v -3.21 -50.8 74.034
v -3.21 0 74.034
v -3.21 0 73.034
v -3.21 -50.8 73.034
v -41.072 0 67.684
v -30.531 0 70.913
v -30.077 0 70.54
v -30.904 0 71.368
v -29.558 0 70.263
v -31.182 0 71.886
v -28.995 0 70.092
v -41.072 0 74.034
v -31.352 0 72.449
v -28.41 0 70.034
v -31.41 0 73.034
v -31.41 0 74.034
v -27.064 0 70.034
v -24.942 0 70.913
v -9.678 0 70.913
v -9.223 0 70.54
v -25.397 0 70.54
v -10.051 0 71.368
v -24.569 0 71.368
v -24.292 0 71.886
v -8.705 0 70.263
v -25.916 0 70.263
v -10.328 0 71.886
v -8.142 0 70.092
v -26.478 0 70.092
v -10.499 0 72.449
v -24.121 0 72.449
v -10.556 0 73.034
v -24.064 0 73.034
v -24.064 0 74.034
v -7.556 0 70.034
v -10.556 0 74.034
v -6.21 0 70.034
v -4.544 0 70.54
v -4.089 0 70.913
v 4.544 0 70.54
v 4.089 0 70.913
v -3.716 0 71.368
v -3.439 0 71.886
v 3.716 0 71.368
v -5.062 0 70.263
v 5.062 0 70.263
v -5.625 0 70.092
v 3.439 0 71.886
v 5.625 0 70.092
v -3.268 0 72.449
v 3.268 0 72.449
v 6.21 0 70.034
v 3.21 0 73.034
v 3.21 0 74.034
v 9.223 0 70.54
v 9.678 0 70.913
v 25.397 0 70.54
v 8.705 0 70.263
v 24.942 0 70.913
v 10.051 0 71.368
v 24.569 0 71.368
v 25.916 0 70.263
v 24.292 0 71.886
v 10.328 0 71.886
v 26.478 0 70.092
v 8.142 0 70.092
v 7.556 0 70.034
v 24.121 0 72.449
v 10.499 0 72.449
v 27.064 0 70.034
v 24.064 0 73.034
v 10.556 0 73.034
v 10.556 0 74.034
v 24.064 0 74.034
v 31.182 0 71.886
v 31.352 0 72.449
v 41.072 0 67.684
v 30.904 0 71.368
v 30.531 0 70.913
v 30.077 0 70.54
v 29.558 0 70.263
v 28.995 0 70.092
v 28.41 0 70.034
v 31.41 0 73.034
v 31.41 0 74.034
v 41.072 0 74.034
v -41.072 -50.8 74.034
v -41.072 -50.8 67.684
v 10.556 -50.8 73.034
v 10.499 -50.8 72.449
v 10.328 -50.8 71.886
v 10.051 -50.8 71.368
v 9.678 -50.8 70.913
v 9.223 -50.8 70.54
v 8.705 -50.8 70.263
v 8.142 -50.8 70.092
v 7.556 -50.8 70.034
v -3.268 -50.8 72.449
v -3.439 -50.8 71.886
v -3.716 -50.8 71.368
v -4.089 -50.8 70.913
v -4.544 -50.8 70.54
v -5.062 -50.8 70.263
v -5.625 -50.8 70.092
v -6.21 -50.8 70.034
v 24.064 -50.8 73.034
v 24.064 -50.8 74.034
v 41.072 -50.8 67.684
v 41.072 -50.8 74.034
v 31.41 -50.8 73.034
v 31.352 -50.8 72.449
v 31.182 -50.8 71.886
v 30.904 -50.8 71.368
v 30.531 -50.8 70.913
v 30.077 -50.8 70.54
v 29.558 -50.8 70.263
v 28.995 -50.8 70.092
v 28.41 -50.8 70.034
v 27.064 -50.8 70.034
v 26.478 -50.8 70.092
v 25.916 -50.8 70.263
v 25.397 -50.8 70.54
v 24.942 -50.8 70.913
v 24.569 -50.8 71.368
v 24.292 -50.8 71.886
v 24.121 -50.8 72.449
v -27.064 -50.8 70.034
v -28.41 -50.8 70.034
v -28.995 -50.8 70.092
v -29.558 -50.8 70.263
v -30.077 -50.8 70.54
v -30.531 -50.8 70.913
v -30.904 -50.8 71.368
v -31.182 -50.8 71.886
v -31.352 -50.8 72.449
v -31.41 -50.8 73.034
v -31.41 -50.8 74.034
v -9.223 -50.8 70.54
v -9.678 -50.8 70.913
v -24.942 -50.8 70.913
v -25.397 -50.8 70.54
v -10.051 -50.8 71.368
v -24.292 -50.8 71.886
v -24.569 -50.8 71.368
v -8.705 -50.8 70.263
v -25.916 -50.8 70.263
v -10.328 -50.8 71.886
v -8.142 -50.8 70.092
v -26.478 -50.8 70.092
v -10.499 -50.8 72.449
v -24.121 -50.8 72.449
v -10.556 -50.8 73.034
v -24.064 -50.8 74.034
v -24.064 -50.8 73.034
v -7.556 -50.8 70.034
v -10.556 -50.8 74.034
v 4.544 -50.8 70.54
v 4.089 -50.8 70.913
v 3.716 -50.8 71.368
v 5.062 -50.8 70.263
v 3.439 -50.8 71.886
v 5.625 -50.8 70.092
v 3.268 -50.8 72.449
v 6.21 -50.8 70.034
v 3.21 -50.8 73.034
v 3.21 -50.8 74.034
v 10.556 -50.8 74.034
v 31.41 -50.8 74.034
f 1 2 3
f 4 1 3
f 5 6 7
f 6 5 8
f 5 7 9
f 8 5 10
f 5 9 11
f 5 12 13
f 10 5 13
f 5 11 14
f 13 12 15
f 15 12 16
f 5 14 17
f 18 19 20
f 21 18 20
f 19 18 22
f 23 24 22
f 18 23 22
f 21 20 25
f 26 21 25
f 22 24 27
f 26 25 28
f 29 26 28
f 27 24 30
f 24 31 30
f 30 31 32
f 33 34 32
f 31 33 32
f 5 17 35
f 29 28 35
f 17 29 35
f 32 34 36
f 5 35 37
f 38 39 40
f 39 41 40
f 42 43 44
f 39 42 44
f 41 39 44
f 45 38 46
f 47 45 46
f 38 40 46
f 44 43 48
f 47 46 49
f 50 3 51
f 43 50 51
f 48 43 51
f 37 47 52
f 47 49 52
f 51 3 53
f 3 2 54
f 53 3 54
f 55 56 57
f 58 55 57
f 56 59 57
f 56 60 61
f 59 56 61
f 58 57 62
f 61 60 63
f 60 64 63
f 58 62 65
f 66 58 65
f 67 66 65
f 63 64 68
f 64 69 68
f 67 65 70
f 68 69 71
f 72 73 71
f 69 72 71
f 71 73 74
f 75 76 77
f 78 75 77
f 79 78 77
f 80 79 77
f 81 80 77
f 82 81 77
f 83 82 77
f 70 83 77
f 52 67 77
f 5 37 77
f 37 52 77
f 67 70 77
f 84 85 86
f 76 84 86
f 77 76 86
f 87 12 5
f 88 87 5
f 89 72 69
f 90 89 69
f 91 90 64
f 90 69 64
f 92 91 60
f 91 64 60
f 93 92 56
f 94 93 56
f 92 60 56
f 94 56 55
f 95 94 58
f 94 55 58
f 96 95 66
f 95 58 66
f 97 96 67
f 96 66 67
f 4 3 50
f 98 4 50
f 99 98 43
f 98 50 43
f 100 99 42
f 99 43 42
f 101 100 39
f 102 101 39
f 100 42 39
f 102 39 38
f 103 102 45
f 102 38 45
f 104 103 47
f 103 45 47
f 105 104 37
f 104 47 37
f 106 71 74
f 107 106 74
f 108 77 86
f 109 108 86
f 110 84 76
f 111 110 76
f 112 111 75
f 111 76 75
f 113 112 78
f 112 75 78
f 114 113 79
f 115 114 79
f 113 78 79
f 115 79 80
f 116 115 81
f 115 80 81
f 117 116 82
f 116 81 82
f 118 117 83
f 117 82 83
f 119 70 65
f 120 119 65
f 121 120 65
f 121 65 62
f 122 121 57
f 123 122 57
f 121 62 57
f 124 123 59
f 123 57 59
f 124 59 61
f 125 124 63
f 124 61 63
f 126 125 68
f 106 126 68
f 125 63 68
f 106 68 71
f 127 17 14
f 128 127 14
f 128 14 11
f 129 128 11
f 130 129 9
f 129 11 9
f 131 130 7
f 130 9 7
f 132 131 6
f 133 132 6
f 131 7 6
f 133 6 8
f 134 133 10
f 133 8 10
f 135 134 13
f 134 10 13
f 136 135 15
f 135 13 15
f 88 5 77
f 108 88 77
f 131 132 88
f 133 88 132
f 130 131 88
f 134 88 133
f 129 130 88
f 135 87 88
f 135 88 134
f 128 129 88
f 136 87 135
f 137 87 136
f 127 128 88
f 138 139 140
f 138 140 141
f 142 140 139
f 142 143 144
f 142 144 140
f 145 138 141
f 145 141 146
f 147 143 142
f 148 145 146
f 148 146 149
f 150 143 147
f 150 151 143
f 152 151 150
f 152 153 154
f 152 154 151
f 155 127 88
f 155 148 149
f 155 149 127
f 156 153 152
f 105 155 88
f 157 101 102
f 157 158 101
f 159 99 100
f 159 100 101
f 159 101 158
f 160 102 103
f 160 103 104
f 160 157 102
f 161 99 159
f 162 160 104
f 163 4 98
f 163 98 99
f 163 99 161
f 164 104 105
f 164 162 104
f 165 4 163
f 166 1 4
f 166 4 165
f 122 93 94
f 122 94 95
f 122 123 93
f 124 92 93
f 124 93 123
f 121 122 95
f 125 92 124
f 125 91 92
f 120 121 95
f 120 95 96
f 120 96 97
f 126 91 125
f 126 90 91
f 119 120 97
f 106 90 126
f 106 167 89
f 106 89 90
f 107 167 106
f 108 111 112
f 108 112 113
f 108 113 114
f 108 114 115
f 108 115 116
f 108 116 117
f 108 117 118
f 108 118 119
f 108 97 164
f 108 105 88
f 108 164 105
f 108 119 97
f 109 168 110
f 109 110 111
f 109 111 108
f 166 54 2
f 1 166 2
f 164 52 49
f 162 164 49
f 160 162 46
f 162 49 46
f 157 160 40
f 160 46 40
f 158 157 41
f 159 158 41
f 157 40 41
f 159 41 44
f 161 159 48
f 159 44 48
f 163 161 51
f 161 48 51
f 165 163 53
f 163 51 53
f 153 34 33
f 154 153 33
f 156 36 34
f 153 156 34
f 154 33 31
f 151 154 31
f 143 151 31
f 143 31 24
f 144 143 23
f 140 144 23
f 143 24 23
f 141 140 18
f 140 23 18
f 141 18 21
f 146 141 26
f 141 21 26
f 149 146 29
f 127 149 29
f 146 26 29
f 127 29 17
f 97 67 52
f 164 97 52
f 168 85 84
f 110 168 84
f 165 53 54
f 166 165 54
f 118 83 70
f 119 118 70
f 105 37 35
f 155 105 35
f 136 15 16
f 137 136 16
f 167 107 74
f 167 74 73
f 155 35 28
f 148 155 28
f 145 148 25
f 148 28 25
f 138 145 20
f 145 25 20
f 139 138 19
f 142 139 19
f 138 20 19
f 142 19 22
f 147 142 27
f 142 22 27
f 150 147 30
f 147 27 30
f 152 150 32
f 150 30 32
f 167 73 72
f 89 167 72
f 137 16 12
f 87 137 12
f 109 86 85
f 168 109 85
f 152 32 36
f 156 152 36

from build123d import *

# Parameters (mm, degrees)
F1_DEPTH = 50.8


with BuildPart() as f1:
    # F0 (on Front) → F1 (new body)
    with BuildSketch(Plane.XZ):
        with BuildLine():
            Line((-31.4099, 74.034357), (-41.0718, 74.034357))
            Line((-41.0718, 74.034357), (-41.0718, 67.684357))
            Line((-41.0718, 67.684357), (41.0718, 67.684357))
            Line((41.0718, 67.684357), (41.0718, 74.034357))
            Line((41.0718, 74.034357), (31.4099, 74.034357))
            Line((31.4099, 74.034357), (31.4099, 73.034357))
            ThreePointArc((31.4099, 73.034357), (30.53122, 70.913037), (28.4099, 70.034357))
            Line((28.4099, 70.034357), (27.0637, 70.034357))
            ThreePointArc((27.0637, 70.034357), (24.94238, 70.913037), (24.0637, 73.034357))
            Line((24.0637, 73.034357), (24.0637, 74.034357))
            Line((24.0637, 74.034357), (10.5565, 74.034357))
            Line((10.5565, 74.034357), (10.5565, 73.924565))
            Line((10.5565, 73.924565), (10.5565, 73.034357))
            ThreePointArc((10.5565, 73.034357), (9.67782, 70.913037), (7.5565, 70.034357))
            Line((7.5565, 70.034357), (6.2103, 70.034357))
            ThreePointArc((6.2103, 70.034357), (4.08898, 70.913037), (3.2103, 73.034357))
            Line((3.2103, 73.034357), (3.2103, 74.034357))
            Line((3.2103, 74.034357), (-3.2103, 74.034357))
            Line((-3.2103, 74.034357), (-3.2103, 73.034357))
            ThreePointArc((-3.2103, 73.034357), (-4.08898, 70.913037), (-6.2103, 70.034357))
            Line((-6.2103, 70.034357), (-7.5565, 70.034357))
            ThreePointArc((-7.5565, 70.034357), (-9.67782, 70.913037), (-10.5565, 73.034357))
            Line((-10.5565, 73.034357), (-10.5565, 74.034357))
            Line((-10.5565, 74.034357), (-24.0637, 74.034357))
            Line((-24.0637, 74.034357), (-24.0637, 73.924565))
            Line((-24.0637, 73.924565), (-24.0637, 73.034357))
            ThreePointArc((-24.0637, 73.034357), (-24.94238, 70.913037), (-27.0637, 70.034357))
            Line((-27.0637, 70.034357), (-28.4099, 70.034357))
            ThreePointArc((-28.4099, 70.034357), (-30.53122, 70.913037), (-31.4099, 73.034357))
            Line((-31.4099, 73.034357), (-31.4099, 74.034357))
        make_face()
    extrude(amount=F1_DEPTH)


solid = f1.part
